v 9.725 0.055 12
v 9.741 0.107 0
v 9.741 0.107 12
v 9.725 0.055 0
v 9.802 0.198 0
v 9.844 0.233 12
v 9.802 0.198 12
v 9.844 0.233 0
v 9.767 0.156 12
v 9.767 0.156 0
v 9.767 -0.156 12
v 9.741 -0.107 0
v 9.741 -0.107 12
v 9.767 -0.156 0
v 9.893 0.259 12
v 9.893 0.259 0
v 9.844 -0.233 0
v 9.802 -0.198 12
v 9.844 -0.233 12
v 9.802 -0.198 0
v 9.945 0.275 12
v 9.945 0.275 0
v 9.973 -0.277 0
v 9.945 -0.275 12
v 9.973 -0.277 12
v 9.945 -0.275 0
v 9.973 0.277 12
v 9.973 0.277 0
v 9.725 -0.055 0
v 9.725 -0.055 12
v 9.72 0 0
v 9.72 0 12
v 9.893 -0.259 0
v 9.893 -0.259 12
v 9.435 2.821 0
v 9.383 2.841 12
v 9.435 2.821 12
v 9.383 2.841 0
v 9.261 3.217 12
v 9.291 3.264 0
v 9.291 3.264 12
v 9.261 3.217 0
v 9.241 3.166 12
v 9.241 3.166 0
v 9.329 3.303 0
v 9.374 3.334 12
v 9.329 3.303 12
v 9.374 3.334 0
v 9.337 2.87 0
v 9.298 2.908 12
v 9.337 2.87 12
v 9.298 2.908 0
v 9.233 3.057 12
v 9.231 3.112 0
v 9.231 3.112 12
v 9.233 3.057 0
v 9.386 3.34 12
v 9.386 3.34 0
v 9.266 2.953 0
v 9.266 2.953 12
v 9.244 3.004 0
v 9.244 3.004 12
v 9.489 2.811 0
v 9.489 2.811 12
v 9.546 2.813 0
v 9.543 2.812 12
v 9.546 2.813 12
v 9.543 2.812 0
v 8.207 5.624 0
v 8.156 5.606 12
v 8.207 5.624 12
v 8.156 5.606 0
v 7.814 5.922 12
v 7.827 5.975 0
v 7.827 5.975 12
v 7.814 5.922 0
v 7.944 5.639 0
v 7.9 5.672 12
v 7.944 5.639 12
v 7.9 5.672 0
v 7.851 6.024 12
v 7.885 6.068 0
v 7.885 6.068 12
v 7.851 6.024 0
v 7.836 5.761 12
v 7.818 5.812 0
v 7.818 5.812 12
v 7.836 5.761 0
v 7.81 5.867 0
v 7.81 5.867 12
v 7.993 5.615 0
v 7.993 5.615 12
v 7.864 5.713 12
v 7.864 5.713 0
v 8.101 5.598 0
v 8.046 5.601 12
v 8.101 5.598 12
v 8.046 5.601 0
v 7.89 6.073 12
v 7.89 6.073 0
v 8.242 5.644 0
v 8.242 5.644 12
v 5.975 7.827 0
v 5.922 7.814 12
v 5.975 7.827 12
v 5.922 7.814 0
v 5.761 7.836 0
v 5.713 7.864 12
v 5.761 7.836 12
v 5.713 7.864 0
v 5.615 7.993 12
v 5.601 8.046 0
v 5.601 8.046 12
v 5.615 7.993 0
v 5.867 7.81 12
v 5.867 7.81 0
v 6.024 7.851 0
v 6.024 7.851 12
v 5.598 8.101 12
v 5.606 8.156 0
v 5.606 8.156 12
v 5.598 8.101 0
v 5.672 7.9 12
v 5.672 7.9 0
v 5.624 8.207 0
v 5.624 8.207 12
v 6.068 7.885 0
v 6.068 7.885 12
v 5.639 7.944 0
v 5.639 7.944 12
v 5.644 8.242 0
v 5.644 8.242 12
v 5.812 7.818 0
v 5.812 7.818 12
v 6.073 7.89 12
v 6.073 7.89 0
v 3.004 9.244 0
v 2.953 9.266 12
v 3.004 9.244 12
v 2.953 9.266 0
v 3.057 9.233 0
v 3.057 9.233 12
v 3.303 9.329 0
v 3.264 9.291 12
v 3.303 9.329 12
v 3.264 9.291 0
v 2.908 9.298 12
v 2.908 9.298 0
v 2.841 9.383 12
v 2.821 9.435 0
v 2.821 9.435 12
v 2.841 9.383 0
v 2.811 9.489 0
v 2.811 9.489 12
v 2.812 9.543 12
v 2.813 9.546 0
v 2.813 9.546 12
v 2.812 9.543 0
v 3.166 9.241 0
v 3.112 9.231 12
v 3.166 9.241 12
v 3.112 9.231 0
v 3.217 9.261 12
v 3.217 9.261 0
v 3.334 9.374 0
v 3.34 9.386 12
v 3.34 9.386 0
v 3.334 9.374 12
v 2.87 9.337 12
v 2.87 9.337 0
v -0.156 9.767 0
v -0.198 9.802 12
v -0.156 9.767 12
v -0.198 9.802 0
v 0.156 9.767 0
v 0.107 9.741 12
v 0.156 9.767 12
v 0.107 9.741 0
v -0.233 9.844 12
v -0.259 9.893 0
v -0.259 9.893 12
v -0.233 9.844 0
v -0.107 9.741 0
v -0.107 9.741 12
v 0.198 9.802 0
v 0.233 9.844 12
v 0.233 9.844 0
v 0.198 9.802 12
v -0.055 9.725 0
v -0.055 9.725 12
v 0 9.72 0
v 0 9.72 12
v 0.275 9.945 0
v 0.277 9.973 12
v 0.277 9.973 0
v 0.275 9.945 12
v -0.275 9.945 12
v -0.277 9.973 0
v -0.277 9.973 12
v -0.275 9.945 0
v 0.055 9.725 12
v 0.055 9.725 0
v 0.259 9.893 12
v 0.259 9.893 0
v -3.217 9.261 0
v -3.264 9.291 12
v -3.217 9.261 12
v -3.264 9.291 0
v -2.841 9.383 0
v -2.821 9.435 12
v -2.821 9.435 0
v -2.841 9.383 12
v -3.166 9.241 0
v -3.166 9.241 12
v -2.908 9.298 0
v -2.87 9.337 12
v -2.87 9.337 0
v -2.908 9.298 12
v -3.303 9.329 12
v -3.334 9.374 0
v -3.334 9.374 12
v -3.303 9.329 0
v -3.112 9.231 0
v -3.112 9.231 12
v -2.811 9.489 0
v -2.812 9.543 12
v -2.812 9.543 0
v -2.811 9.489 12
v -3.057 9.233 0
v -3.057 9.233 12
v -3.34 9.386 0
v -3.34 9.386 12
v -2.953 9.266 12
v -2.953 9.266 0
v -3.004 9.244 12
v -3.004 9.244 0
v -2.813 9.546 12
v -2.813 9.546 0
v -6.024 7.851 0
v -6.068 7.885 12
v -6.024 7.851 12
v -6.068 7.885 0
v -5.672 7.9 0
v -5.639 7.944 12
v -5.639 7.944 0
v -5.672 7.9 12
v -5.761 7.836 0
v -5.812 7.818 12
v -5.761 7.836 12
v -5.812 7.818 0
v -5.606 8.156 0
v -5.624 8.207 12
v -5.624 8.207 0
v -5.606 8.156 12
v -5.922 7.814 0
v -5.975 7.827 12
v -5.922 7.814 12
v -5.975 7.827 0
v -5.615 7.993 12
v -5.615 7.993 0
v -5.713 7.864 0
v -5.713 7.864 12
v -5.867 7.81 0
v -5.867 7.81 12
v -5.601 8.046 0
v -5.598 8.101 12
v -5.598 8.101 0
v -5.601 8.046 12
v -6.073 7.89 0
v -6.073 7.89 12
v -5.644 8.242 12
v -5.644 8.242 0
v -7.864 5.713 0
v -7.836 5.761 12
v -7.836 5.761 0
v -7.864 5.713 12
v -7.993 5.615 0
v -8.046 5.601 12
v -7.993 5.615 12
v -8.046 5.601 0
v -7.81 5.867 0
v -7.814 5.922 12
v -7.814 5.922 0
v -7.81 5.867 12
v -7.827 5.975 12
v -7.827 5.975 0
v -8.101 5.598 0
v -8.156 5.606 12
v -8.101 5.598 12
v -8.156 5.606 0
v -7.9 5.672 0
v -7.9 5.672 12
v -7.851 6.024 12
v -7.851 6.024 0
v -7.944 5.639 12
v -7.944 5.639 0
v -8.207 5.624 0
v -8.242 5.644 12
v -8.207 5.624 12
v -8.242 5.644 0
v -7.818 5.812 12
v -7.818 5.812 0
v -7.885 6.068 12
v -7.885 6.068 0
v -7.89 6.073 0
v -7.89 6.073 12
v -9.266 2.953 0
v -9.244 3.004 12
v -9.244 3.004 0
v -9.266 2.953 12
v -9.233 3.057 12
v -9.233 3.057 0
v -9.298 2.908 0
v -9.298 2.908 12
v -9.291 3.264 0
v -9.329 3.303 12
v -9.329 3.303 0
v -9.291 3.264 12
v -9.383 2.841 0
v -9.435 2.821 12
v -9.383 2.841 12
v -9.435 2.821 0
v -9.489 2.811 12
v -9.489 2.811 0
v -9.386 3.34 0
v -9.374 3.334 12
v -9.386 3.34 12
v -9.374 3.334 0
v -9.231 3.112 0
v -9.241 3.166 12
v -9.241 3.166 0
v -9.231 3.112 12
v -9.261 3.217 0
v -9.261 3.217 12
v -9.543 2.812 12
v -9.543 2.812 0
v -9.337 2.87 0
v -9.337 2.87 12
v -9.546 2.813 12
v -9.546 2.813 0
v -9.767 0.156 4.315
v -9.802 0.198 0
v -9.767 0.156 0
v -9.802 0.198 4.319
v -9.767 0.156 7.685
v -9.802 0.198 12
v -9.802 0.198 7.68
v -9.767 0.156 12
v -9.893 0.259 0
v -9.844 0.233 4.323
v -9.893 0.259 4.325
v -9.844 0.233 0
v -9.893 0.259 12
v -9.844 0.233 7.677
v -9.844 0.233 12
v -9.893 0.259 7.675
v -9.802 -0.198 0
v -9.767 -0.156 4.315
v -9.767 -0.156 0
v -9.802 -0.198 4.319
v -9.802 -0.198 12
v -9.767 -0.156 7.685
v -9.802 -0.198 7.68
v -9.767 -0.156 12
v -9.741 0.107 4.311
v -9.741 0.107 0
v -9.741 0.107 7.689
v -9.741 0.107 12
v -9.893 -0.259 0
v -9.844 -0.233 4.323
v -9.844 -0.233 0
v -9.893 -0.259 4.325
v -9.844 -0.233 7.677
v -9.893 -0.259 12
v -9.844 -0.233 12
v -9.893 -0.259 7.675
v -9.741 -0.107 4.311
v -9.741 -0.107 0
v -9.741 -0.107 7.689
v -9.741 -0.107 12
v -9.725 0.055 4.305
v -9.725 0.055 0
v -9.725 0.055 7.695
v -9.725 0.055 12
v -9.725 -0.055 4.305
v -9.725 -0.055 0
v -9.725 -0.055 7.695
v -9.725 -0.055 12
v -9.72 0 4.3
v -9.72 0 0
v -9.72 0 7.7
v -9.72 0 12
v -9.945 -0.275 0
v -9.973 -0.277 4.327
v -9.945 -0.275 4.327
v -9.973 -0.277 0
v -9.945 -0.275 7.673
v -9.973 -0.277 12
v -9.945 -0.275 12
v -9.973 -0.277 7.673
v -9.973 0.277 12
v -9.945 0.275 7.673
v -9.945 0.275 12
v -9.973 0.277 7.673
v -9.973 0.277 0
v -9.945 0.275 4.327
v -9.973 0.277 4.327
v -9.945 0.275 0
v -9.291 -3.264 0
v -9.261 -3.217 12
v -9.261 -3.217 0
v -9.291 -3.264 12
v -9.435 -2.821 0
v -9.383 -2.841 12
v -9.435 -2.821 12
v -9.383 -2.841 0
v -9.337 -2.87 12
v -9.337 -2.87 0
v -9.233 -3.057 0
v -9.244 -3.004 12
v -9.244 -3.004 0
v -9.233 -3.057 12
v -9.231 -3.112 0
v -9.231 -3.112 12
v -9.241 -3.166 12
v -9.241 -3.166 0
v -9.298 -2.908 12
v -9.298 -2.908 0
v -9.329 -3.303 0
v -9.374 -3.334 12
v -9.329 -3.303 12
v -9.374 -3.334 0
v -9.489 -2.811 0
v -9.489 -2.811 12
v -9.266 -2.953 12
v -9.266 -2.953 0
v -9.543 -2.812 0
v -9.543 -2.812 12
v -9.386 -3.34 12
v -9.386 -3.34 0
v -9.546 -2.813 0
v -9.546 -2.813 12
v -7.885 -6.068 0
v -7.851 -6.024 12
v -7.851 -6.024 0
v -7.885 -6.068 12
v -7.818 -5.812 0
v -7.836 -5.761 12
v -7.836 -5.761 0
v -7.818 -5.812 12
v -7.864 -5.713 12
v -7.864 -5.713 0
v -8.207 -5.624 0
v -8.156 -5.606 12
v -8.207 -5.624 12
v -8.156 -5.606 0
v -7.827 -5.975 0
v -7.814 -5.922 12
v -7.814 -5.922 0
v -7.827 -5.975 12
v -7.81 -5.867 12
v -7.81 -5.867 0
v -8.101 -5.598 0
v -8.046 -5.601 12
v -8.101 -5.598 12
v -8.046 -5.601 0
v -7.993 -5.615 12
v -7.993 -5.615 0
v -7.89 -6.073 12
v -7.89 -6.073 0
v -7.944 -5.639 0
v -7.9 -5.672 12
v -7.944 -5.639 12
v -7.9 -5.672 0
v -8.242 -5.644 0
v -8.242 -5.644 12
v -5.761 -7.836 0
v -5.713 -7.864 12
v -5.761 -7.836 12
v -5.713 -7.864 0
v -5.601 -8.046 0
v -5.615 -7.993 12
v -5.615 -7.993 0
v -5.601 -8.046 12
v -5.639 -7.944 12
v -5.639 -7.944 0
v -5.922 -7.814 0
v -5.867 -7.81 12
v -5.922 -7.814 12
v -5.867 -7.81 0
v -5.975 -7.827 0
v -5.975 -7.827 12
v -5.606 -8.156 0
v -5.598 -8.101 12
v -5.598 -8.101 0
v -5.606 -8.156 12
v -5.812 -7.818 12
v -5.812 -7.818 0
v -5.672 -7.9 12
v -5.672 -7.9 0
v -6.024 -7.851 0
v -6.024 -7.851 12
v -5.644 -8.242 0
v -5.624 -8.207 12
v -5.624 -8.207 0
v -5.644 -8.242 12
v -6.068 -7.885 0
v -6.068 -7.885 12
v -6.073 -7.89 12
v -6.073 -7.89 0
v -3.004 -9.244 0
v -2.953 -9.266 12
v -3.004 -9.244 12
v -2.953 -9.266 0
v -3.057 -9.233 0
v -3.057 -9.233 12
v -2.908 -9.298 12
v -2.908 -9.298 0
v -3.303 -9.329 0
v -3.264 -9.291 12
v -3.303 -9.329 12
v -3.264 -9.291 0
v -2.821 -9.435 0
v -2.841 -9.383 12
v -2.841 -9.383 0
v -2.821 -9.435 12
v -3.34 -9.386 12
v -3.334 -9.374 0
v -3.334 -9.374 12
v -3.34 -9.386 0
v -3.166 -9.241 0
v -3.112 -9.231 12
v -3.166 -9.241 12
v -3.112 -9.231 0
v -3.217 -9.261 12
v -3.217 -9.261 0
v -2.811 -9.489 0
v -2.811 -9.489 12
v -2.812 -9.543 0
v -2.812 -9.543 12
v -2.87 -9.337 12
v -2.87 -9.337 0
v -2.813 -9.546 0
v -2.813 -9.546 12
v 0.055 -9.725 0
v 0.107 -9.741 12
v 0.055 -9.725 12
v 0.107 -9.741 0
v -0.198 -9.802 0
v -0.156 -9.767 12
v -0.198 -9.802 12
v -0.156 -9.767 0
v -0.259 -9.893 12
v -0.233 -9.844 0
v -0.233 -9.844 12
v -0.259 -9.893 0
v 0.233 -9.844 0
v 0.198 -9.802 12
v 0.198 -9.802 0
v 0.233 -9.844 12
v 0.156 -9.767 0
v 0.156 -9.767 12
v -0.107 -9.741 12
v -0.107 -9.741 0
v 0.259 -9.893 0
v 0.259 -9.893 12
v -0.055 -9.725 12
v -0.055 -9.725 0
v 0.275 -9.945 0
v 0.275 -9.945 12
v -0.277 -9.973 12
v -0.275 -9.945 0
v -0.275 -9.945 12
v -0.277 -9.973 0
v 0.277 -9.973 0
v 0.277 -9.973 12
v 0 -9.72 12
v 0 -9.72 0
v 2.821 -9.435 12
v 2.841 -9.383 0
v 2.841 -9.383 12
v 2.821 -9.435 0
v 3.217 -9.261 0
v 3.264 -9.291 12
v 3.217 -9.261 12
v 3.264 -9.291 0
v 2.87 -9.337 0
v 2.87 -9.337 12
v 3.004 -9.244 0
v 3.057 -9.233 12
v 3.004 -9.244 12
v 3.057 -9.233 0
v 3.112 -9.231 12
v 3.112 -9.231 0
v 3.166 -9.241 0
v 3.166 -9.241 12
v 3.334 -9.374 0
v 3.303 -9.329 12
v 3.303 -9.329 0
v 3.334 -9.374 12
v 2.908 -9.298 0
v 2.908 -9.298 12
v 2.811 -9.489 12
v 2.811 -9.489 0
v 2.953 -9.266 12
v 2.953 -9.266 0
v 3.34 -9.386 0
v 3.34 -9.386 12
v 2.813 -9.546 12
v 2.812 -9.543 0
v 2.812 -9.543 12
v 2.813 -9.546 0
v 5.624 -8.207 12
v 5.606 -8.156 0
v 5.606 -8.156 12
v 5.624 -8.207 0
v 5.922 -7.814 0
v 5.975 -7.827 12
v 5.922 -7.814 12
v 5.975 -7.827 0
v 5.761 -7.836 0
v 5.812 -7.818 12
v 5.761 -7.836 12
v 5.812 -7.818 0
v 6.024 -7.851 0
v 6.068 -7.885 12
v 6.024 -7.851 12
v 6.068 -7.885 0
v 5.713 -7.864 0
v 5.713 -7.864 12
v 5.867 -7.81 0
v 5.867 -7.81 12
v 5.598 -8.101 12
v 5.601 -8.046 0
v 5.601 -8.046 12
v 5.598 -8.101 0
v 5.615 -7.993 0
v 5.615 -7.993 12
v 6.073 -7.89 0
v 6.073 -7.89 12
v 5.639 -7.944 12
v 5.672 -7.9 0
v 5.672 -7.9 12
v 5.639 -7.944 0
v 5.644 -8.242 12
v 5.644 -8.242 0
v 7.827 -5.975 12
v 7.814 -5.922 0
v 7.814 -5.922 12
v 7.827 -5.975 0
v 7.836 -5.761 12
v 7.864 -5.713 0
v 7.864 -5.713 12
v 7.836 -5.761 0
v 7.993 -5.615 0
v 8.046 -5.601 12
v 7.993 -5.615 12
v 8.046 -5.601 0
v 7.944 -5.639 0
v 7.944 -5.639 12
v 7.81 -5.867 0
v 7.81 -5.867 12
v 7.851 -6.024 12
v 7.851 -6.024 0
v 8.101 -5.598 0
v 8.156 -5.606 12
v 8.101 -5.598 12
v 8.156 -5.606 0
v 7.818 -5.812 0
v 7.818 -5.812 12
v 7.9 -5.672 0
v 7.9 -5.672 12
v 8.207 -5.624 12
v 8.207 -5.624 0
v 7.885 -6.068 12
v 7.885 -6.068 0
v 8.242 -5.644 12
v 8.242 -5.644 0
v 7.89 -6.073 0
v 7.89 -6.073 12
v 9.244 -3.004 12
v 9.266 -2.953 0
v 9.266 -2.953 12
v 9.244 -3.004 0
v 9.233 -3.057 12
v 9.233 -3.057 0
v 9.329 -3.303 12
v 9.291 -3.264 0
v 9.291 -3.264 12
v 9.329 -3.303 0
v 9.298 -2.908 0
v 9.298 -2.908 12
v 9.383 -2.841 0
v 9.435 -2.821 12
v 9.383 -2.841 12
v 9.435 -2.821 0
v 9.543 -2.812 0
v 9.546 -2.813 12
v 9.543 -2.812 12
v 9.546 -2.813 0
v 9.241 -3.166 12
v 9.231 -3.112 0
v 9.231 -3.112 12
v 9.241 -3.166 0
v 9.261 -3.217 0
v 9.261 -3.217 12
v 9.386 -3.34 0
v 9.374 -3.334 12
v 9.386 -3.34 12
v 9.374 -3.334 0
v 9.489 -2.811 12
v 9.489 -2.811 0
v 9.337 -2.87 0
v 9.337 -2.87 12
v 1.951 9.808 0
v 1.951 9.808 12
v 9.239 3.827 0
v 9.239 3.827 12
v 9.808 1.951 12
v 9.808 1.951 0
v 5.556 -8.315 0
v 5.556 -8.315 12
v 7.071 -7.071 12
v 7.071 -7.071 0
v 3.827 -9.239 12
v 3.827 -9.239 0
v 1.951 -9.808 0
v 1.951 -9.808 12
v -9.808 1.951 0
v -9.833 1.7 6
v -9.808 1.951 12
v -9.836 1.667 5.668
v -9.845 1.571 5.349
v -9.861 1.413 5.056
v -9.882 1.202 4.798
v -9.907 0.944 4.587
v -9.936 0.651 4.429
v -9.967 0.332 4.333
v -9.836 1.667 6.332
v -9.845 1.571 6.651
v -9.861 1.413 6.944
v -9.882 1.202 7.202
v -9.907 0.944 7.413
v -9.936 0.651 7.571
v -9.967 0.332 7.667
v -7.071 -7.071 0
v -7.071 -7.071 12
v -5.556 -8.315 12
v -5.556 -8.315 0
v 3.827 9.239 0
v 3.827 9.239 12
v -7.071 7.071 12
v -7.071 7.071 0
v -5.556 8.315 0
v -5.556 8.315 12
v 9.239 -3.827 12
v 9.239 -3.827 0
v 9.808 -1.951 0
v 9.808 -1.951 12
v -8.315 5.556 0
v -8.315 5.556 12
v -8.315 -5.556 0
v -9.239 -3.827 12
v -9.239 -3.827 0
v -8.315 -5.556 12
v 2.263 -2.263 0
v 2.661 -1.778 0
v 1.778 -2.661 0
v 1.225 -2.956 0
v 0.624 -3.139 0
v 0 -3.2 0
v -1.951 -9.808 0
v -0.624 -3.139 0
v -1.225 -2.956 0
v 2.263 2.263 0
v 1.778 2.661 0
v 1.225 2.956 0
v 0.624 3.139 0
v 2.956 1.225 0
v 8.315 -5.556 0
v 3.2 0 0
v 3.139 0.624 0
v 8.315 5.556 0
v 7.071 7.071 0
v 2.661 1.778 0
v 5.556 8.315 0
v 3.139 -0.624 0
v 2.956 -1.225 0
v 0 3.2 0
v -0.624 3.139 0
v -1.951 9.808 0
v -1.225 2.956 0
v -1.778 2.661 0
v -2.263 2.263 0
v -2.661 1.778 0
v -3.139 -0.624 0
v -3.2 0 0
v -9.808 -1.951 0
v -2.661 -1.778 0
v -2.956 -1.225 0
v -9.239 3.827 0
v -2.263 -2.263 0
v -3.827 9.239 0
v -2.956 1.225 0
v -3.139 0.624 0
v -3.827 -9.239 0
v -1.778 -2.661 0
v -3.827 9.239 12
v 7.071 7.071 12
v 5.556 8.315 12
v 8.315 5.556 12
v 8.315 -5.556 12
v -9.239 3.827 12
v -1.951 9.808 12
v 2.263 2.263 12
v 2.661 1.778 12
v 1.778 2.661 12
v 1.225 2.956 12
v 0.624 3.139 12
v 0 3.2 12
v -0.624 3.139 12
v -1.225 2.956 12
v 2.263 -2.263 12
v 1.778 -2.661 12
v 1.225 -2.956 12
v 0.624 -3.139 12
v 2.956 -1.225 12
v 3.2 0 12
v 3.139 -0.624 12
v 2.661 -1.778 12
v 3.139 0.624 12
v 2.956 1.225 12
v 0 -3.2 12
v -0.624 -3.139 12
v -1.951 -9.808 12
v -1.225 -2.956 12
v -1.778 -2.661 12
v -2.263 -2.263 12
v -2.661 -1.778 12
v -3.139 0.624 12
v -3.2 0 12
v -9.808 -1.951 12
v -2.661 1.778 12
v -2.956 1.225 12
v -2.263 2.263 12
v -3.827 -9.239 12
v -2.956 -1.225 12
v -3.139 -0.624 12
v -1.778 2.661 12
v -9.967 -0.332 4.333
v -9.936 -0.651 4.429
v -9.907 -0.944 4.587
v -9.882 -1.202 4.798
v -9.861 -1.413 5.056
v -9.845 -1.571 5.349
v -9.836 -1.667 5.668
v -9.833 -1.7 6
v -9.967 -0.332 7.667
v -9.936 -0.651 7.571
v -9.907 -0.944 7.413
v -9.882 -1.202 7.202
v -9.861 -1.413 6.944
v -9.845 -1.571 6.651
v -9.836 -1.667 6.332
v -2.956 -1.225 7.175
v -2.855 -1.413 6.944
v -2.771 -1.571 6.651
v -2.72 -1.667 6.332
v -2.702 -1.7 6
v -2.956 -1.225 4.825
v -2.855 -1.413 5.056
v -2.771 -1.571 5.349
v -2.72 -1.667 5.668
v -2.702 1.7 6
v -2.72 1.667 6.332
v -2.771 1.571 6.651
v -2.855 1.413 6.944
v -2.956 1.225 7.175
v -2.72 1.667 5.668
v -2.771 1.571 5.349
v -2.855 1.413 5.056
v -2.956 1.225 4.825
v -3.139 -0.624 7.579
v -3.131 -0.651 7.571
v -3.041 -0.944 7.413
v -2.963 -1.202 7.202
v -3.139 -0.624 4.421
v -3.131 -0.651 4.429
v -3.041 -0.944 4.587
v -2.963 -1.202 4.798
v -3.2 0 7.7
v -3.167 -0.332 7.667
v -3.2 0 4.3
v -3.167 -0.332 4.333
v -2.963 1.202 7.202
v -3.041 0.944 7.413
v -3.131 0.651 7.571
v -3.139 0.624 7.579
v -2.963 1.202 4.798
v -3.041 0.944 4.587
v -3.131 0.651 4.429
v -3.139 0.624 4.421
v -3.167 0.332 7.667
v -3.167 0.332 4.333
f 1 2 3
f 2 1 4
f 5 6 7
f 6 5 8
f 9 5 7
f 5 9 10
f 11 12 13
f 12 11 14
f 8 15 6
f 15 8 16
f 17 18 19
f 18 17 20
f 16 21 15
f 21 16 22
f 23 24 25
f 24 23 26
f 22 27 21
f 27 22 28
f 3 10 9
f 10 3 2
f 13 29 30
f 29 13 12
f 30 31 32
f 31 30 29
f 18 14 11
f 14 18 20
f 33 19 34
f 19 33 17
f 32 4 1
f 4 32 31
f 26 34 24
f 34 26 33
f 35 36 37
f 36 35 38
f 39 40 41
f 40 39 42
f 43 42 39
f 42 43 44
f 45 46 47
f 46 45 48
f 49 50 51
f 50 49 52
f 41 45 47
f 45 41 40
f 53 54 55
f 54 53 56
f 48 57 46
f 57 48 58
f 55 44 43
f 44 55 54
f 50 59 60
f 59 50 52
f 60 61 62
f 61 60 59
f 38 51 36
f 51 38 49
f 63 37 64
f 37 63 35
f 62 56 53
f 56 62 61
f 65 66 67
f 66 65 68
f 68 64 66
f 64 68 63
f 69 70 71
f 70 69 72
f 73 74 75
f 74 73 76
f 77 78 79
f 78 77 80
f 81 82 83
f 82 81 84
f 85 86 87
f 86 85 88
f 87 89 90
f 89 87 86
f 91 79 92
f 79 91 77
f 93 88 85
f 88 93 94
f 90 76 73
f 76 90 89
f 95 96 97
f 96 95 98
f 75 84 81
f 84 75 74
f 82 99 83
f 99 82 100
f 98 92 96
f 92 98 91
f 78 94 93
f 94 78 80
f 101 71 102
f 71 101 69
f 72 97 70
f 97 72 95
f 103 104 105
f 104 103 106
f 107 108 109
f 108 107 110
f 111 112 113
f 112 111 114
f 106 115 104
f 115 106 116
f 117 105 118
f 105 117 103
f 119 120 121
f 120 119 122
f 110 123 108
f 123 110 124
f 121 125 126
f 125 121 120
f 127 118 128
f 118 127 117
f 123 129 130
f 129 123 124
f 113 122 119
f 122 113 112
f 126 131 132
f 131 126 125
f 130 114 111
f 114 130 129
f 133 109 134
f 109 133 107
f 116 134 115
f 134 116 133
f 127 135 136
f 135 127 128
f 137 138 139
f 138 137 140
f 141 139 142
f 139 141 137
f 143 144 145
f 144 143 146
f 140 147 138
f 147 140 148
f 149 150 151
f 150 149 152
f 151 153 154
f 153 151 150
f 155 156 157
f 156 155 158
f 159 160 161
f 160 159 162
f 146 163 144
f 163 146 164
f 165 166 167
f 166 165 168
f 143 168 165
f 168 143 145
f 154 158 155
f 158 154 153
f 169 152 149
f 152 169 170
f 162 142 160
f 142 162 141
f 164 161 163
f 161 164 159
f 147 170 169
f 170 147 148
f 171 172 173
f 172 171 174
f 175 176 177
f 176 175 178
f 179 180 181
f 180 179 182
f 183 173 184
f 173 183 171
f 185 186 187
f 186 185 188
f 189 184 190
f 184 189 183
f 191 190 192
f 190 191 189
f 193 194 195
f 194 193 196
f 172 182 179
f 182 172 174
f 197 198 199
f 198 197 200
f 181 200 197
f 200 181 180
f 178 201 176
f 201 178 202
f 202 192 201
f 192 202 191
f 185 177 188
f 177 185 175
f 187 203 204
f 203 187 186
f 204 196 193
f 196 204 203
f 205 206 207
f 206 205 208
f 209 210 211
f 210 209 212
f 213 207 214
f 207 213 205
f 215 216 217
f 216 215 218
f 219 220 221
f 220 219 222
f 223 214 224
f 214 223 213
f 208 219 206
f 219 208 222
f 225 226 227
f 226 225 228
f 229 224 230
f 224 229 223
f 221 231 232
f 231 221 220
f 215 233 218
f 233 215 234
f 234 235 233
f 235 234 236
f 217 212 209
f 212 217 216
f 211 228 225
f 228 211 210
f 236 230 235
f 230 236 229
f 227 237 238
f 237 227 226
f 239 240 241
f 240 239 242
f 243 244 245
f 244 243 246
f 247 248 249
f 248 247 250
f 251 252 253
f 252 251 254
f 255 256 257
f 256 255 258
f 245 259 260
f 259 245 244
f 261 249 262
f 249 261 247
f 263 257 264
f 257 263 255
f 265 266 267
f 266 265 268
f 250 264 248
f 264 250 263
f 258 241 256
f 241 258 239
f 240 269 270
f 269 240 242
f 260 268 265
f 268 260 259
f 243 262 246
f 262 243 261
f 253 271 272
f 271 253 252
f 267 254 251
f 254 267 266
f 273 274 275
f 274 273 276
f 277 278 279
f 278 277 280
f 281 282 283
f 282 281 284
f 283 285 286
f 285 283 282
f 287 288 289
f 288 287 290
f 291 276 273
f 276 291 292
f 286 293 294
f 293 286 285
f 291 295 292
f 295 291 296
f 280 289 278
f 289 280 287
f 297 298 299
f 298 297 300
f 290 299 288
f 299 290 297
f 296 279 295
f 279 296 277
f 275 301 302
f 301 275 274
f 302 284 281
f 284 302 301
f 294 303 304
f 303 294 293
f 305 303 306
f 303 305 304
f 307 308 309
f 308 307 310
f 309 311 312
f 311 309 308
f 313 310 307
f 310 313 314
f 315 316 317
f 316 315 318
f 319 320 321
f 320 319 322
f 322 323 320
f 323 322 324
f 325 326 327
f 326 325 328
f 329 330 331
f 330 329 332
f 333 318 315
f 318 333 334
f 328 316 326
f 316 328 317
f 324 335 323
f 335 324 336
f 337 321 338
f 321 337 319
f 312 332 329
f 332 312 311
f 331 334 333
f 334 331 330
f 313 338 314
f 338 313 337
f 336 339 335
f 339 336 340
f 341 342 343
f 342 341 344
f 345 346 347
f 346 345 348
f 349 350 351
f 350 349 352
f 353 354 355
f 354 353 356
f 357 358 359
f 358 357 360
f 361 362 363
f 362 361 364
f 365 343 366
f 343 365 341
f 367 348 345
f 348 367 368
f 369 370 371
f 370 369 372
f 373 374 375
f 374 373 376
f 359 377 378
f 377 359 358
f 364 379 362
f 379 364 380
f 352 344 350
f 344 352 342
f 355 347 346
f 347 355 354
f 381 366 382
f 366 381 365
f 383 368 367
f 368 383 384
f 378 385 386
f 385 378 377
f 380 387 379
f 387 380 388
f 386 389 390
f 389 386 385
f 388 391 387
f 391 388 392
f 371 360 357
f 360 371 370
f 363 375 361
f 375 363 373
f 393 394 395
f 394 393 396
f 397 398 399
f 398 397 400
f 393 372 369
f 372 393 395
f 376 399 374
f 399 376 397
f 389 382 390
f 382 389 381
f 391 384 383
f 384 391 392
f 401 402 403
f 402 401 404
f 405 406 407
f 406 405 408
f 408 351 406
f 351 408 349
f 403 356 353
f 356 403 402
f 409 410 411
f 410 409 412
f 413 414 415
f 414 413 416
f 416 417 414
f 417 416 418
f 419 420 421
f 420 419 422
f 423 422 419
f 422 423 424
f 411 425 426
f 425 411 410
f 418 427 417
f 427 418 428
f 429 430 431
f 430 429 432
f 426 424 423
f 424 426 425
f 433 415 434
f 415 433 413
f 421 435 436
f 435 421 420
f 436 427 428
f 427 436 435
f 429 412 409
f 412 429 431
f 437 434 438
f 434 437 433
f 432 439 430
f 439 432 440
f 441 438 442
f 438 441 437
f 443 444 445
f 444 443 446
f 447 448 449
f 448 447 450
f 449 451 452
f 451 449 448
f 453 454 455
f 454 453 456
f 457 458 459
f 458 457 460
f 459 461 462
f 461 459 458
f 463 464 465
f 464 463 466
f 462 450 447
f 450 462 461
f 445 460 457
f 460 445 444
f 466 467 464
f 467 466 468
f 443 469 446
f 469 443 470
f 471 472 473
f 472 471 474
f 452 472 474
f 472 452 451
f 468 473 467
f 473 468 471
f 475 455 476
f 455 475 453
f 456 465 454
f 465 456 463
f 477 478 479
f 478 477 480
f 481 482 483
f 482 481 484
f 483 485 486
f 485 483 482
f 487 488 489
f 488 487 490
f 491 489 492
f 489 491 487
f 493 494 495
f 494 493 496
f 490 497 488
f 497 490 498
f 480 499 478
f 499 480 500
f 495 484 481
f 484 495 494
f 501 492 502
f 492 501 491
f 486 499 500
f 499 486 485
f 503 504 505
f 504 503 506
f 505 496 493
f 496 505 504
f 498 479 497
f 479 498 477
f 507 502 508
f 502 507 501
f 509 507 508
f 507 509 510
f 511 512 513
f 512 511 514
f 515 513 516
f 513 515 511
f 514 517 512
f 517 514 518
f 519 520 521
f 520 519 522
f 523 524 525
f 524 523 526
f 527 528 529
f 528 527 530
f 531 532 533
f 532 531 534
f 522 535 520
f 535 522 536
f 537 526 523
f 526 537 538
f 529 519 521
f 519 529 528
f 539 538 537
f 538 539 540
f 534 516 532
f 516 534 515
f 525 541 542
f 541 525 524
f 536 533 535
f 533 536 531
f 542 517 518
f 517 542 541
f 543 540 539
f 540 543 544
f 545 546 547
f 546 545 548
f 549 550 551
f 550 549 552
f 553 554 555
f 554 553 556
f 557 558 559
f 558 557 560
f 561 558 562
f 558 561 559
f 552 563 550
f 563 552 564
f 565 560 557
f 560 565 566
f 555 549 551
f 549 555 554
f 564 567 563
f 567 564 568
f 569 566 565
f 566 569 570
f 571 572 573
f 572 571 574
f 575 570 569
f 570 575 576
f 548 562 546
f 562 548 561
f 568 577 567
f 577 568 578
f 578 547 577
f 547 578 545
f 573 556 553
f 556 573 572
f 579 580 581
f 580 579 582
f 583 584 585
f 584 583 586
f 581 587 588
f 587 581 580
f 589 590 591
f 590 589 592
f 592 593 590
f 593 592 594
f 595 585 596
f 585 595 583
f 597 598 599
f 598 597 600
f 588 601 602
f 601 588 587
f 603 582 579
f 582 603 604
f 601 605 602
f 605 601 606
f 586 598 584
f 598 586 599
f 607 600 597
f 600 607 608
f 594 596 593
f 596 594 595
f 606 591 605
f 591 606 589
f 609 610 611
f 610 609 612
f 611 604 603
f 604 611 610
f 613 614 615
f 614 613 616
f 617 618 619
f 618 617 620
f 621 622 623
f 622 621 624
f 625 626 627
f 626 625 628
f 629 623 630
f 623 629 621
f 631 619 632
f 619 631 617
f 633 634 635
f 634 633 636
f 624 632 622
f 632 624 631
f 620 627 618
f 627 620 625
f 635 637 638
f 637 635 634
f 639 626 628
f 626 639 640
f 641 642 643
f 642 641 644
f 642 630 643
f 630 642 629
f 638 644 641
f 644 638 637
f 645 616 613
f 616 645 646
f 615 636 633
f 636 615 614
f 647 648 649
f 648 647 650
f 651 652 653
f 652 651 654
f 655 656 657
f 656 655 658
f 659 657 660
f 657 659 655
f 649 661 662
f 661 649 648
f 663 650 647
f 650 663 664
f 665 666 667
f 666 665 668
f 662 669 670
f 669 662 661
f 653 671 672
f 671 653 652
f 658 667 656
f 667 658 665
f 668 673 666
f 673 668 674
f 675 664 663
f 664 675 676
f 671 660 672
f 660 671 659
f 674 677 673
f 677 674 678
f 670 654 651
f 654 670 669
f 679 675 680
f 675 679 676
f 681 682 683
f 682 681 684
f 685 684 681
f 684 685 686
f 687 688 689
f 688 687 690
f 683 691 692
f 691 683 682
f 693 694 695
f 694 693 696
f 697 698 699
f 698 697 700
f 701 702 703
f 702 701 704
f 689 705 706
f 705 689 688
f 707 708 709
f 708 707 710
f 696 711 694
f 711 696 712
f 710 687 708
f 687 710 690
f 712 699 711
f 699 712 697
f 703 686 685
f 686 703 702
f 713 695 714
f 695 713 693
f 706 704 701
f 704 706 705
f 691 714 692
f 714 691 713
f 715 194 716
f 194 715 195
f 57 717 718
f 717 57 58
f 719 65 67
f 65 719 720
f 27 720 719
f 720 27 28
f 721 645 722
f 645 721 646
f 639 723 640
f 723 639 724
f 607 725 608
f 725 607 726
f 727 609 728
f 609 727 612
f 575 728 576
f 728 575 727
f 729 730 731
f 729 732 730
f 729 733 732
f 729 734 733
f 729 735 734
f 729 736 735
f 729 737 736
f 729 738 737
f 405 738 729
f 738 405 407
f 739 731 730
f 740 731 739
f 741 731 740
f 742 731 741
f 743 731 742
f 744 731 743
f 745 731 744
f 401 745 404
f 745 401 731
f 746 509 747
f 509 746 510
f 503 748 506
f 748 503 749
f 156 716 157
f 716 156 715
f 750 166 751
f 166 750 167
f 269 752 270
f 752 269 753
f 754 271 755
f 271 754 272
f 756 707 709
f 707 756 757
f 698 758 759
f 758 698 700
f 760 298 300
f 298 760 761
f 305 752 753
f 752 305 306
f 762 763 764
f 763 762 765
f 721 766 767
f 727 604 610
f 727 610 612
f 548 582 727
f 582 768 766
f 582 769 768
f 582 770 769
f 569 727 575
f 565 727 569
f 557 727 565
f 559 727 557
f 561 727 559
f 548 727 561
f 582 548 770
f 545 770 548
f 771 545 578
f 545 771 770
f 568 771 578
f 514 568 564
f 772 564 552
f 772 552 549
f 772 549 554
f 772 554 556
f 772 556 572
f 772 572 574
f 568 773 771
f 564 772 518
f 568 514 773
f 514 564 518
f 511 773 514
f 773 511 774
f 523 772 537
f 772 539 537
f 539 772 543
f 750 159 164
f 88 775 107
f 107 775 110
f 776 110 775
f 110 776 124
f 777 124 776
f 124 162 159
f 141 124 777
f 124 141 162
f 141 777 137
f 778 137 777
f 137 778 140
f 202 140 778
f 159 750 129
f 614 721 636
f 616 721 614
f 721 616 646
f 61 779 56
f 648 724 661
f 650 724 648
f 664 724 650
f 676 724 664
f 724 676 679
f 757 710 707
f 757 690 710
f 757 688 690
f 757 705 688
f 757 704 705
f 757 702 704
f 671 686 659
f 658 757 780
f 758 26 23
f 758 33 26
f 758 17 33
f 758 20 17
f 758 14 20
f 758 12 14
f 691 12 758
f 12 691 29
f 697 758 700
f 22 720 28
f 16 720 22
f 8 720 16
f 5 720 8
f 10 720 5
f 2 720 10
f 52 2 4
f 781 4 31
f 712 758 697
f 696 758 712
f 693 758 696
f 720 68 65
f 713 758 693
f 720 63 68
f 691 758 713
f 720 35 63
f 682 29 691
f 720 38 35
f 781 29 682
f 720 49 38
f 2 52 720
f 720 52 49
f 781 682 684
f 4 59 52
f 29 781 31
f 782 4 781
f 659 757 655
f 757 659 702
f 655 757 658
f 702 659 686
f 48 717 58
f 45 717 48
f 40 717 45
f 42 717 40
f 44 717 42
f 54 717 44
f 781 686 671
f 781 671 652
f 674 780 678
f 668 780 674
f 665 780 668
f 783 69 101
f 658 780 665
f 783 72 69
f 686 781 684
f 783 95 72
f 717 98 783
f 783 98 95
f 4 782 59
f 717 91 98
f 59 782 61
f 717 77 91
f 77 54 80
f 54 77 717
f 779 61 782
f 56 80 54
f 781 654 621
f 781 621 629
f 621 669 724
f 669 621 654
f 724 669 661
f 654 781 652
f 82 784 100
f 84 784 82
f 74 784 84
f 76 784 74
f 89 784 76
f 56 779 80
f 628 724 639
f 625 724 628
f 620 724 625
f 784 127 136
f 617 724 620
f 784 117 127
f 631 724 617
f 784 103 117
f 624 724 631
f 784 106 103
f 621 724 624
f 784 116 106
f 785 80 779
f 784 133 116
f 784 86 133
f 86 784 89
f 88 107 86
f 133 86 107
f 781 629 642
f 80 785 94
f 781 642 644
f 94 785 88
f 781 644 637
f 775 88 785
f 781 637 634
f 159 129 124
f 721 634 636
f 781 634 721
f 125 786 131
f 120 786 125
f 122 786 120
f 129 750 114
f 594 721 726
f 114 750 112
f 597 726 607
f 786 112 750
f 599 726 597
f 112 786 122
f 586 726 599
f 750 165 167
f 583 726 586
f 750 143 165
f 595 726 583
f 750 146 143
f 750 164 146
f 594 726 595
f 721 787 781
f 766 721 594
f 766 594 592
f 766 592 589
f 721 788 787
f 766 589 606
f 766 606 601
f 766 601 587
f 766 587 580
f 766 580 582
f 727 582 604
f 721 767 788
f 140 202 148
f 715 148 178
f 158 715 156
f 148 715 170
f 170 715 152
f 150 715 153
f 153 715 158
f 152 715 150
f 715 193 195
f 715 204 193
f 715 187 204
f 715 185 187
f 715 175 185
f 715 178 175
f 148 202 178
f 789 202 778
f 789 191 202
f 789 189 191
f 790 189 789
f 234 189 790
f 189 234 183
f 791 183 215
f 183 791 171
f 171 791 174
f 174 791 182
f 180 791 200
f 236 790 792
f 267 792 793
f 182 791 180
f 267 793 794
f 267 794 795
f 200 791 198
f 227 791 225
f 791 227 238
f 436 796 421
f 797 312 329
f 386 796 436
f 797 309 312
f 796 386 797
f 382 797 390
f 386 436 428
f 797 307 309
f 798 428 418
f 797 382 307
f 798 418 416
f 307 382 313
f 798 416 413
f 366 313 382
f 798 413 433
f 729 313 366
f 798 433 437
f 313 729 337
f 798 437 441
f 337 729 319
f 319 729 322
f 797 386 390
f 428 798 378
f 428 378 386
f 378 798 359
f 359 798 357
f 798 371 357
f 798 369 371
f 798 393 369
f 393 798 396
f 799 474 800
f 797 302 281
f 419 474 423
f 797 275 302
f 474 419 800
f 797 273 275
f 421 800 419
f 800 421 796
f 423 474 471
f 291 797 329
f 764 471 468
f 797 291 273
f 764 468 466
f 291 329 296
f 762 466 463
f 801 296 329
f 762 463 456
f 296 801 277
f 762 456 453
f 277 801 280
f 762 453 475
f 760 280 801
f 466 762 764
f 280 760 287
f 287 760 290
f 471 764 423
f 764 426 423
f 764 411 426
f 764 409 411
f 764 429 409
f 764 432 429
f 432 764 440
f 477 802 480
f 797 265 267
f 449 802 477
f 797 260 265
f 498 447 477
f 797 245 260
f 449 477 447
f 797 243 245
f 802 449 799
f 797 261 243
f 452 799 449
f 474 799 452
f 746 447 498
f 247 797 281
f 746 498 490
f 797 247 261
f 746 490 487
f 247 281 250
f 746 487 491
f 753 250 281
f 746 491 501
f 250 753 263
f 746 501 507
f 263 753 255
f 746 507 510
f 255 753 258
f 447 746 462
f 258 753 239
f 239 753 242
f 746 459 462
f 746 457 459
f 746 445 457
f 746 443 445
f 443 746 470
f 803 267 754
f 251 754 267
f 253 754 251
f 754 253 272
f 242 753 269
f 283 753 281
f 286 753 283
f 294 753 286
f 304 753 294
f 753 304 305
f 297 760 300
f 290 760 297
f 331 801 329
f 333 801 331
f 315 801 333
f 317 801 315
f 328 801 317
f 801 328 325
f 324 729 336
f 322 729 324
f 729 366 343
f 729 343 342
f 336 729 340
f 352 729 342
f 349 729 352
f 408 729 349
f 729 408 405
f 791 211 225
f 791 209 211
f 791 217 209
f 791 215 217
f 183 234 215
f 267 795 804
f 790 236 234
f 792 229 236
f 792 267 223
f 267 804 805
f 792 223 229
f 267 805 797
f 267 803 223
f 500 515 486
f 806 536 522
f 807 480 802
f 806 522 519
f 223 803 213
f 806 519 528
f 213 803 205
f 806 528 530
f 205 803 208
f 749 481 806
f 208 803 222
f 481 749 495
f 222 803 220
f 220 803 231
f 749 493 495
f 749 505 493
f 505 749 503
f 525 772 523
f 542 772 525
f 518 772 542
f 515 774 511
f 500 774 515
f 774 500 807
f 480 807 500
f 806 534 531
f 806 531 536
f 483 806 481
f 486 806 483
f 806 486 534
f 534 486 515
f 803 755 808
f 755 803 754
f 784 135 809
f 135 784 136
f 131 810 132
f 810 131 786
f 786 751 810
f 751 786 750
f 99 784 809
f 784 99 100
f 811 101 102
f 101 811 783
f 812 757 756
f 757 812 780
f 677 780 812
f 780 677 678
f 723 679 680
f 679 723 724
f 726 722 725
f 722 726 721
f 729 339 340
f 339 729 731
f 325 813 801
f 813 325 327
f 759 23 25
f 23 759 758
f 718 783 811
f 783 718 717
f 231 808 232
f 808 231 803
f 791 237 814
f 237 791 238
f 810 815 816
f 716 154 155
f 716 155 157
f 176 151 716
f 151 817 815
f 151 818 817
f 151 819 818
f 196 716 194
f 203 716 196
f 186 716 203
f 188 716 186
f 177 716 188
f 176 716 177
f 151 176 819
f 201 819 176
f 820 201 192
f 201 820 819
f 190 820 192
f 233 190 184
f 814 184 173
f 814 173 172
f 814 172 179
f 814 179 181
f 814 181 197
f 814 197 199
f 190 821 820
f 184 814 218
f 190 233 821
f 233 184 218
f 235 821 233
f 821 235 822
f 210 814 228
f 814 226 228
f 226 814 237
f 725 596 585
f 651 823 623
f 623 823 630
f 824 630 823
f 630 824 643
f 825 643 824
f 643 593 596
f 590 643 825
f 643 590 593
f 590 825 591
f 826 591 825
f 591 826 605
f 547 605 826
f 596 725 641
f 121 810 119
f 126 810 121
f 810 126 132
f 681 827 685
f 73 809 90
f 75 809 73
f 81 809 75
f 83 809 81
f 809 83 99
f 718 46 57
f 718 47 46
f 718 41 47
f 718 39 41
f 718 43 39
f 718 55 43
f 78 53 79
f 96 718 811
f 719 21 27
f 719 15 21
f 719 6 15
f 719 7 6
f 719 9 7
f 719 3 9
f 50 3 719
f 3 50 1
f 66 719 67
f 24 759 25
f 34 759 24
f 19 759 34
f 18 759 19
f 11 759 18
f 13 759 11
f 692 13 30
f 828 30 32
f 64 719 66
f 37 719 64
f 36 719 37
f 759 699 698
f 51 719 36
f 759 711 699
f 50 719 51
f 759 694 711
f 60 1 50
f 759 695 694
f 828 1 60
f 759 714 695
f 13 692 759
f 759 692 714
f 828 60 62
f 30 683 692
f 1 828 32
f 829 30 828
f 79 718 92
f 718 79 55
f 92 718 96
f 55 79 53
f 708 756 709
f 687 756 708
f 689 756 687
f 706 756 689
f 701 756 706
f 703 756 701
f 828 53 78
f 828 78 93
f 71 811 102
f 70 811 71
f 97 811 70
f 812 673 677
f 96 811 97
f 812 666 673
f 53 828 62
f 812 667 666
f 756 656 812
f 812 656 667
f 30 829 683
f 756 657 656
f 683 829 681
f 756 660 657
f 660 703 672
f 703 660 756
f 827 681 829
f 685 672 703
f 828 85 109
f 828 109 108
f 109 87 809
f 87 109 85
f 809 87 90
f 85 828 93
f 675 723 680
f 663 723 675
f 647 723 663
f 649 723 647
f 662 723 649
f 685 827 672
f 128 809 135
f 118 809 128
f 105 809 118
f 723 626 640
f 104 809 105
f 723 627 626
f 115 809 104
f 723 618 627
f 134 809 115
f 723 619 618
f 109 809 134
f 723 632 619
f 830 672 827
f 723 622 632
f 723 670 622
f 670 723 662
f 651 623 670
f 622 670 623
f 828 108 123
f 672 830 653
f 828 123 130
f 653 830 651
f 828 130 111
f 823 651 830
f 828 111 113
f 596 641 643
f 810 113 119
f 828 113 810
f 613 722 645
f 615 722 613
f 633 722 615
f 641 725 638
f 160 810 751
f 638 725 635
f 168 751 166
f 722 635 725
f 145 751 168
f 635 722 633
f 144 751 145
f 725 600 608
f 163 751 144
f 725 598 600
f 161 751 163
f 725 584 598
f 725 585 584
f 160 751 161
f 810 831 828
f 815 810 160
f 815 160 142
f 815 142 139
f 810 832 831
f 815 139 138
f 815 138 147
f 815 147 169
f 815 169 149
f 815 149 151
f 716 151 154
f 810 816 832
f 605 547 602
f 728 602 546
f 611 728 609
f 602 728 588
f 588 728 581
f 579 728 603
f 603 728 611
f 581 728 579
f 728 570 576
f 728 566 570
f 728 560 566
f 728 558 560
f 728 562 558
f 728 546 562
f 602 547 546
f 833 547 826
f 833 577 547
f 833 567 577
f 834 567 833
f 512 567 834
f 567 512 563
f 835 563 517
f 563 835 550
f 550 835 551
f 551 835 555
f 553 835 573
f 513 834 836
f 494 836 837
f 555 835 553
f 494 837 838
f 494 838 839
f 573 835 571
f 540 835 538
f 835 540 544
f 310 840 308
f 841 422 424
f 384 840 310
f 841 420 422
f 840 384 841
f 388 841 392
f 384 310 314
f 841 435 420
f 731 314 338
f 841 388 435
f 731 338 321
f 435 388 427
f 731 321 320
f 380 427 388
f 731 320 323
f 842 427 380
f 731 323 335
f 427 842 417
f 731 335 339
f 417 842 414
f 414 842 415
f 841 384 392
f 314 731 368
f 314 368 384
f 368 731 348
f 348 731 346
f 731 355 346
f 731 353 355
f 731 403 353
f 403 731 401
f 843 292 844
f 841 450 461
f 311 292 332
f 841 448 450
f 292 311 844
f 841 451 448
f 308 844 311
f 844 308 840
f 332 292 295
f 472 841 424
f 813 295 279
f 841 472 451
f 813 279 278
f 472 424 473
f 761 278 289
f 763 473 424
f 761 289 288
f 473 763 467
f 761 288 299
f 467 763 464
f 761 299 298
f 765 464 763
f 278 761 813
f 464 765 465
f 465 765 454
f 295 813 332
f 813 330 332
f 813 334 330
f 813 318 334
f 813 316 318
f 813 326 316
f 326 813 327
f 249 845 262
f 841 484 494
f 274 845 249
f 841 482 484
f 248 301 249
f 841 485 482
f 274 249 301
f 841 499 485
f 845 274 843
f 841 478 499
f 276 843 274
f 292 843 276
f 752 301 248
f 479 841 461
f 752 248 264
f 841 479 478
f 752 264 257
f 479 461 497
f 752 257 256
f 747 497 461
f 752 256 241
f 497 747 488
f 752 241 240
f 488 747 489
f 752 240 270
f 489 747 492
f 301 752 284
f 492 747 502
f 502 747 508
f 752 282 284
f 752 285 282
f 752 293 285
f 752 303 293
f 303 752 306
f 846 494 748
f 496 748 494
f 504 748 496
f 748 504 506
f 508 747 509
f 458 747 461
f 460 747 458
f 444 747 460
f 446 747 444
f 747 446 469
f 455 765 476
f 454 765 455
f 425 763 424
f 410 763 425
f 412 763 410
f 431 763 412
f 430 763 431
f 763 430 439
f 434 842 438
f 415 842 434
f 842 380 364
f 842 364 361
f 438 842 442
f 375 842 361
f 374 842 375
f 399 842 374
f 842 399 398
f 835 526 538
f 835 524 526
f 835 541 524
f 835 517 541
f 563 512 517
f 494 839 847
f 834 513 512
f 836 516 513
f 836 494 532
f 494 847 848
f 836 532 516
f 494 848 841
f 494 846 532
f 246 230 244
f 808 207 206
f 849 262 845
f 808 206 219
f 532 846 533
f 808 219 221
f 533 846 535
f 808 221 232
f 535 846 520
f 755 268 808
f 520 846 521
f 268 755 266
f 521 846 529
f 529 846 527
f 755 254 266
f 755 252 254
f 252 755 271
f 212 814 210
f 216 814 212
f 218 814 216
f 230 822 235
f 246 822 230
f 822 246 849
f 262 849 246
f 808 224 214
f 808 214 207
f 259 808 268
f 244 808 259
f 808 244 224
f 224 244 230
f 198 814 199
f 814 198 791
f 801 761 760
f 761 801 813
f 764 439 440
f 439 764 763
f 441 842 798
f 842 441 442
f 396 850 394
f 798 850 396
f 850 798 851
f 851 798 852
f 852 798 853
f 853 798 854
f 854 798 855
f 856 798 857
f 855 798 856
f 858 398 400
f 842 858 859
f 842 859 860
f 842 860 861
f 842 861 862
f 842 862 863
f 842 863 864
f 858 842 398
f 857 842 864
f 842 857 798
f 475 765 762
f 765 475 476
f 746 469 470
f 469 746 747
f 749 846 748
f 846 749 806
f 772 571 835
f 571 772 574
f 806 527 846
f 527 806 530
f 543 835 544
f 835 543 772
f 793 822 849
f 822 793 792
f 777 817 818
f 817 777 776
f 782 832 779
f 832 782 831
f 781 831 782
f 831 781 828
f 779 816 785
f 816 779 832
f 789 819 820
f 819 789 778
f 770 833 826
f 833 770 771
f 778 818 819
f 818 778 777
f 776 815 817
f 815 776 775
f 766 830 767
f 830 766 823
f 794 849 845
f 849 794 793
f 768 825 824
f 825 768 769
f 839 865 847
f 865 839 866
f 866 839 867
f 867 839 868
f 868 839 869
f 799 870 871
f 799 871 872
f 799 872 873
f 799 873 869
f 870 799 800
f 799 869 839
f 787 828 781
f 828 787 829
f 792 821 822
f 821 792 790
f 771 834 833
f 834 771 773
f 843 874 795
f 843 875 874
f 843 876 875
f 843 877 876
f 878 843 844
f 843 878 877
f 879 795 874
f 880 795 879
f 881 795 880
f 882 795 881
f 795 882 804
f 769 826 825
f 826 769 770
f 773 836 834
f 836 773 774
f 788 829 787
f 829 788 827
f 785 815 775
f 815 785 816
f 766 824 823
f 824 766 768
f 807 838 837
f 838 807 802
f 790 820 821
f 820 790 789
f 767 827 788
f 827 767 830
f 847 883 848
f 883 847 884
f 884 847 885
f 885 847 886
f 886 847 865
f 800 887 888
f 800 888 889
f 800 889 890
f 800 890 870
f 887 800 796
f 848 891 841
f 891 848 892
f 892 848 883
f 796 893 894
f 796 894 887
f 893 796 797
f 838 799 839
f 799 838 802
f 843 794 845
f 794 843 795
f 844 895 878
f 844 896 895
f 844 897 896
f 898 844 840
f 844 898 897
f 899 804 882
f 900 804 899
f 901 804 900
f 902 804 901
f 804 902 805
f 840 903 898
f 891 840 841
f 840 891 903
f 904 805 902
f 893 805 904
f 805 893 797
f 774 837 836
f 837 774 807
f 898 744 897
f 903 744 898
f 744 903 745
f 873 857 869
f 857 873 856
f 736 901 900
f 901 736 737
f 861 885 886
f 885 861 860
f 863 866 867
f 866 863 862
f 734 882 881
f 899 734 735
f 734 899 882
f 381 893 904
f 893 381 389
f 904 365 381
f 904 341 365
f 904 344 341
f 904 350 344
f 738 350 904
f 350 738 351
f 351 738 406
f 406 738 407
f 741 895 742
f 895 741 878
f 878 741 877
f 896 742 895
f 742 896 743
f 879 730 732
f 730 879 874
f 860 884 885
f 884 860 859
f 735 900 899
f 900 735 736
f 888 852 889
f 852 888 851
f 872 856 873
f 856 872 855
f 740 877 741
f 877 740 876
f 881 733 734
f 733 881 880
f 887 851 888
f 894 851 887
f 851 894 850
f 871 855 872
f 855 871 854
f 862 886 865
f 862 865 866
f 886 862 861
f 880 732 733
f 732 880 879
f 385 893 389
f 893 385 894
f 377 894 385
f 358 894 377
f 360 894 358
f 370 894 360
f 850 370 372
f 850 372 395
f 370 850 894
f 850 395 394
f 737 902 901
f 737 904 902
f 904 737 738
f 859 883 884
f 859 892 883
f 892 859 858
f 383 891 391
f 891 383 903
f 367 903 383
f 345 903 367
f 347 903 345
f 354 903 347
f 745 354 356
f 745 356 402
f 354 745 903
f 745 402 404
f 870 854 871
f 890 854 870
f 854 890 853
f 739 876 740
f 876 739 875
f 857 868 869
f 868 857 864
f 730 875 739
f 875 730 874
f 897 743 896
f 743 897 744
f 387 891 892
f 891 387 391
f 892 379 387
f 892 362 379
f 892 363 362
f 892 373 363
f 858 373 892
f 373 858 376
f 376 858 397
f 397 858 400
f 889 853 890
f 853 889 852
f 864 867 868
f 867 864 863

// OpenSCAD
$fn = 32;

// ----------------------------------------------------------------------
// Hand knob: 20 x 20 x 12 mm
// ----------------------------------------------------------------------

// --- parameters (mm) ---
knob_d = 20;              // knob diameter
knob_h = 12;              // knob height
bore_d = 6.4;             // shaft bore
set_d = 3.4;              // set screw tap hole
knurl_d = 0.56;           // knurl groove diameter
knurl_n = 20;             // number of knurl grooves

module body() {
  cylinder(h = knob_h, d = knob_d);
}

difference() {
  union() {
    body();
  }
  translate([0, 0, -1]) cylinder(h = knob_h + 0 + 2, d = bore_d);
  /* knurl grooves */
  for (i = [0 : knurl_n - 1])
    rotate([0, 0, i * 360 / knurl_n])
      translate([knob_d / 2, 0, -0.5])
        cylinder(h = knob_h + 1, d = knurl_d);
  translate([-knob_d / 2 - 1, 0, knob_h * 0.5]) rotate([0, 90, 0]) cylinder(h = knob_d / 2 + 2, d = set_d);
}
